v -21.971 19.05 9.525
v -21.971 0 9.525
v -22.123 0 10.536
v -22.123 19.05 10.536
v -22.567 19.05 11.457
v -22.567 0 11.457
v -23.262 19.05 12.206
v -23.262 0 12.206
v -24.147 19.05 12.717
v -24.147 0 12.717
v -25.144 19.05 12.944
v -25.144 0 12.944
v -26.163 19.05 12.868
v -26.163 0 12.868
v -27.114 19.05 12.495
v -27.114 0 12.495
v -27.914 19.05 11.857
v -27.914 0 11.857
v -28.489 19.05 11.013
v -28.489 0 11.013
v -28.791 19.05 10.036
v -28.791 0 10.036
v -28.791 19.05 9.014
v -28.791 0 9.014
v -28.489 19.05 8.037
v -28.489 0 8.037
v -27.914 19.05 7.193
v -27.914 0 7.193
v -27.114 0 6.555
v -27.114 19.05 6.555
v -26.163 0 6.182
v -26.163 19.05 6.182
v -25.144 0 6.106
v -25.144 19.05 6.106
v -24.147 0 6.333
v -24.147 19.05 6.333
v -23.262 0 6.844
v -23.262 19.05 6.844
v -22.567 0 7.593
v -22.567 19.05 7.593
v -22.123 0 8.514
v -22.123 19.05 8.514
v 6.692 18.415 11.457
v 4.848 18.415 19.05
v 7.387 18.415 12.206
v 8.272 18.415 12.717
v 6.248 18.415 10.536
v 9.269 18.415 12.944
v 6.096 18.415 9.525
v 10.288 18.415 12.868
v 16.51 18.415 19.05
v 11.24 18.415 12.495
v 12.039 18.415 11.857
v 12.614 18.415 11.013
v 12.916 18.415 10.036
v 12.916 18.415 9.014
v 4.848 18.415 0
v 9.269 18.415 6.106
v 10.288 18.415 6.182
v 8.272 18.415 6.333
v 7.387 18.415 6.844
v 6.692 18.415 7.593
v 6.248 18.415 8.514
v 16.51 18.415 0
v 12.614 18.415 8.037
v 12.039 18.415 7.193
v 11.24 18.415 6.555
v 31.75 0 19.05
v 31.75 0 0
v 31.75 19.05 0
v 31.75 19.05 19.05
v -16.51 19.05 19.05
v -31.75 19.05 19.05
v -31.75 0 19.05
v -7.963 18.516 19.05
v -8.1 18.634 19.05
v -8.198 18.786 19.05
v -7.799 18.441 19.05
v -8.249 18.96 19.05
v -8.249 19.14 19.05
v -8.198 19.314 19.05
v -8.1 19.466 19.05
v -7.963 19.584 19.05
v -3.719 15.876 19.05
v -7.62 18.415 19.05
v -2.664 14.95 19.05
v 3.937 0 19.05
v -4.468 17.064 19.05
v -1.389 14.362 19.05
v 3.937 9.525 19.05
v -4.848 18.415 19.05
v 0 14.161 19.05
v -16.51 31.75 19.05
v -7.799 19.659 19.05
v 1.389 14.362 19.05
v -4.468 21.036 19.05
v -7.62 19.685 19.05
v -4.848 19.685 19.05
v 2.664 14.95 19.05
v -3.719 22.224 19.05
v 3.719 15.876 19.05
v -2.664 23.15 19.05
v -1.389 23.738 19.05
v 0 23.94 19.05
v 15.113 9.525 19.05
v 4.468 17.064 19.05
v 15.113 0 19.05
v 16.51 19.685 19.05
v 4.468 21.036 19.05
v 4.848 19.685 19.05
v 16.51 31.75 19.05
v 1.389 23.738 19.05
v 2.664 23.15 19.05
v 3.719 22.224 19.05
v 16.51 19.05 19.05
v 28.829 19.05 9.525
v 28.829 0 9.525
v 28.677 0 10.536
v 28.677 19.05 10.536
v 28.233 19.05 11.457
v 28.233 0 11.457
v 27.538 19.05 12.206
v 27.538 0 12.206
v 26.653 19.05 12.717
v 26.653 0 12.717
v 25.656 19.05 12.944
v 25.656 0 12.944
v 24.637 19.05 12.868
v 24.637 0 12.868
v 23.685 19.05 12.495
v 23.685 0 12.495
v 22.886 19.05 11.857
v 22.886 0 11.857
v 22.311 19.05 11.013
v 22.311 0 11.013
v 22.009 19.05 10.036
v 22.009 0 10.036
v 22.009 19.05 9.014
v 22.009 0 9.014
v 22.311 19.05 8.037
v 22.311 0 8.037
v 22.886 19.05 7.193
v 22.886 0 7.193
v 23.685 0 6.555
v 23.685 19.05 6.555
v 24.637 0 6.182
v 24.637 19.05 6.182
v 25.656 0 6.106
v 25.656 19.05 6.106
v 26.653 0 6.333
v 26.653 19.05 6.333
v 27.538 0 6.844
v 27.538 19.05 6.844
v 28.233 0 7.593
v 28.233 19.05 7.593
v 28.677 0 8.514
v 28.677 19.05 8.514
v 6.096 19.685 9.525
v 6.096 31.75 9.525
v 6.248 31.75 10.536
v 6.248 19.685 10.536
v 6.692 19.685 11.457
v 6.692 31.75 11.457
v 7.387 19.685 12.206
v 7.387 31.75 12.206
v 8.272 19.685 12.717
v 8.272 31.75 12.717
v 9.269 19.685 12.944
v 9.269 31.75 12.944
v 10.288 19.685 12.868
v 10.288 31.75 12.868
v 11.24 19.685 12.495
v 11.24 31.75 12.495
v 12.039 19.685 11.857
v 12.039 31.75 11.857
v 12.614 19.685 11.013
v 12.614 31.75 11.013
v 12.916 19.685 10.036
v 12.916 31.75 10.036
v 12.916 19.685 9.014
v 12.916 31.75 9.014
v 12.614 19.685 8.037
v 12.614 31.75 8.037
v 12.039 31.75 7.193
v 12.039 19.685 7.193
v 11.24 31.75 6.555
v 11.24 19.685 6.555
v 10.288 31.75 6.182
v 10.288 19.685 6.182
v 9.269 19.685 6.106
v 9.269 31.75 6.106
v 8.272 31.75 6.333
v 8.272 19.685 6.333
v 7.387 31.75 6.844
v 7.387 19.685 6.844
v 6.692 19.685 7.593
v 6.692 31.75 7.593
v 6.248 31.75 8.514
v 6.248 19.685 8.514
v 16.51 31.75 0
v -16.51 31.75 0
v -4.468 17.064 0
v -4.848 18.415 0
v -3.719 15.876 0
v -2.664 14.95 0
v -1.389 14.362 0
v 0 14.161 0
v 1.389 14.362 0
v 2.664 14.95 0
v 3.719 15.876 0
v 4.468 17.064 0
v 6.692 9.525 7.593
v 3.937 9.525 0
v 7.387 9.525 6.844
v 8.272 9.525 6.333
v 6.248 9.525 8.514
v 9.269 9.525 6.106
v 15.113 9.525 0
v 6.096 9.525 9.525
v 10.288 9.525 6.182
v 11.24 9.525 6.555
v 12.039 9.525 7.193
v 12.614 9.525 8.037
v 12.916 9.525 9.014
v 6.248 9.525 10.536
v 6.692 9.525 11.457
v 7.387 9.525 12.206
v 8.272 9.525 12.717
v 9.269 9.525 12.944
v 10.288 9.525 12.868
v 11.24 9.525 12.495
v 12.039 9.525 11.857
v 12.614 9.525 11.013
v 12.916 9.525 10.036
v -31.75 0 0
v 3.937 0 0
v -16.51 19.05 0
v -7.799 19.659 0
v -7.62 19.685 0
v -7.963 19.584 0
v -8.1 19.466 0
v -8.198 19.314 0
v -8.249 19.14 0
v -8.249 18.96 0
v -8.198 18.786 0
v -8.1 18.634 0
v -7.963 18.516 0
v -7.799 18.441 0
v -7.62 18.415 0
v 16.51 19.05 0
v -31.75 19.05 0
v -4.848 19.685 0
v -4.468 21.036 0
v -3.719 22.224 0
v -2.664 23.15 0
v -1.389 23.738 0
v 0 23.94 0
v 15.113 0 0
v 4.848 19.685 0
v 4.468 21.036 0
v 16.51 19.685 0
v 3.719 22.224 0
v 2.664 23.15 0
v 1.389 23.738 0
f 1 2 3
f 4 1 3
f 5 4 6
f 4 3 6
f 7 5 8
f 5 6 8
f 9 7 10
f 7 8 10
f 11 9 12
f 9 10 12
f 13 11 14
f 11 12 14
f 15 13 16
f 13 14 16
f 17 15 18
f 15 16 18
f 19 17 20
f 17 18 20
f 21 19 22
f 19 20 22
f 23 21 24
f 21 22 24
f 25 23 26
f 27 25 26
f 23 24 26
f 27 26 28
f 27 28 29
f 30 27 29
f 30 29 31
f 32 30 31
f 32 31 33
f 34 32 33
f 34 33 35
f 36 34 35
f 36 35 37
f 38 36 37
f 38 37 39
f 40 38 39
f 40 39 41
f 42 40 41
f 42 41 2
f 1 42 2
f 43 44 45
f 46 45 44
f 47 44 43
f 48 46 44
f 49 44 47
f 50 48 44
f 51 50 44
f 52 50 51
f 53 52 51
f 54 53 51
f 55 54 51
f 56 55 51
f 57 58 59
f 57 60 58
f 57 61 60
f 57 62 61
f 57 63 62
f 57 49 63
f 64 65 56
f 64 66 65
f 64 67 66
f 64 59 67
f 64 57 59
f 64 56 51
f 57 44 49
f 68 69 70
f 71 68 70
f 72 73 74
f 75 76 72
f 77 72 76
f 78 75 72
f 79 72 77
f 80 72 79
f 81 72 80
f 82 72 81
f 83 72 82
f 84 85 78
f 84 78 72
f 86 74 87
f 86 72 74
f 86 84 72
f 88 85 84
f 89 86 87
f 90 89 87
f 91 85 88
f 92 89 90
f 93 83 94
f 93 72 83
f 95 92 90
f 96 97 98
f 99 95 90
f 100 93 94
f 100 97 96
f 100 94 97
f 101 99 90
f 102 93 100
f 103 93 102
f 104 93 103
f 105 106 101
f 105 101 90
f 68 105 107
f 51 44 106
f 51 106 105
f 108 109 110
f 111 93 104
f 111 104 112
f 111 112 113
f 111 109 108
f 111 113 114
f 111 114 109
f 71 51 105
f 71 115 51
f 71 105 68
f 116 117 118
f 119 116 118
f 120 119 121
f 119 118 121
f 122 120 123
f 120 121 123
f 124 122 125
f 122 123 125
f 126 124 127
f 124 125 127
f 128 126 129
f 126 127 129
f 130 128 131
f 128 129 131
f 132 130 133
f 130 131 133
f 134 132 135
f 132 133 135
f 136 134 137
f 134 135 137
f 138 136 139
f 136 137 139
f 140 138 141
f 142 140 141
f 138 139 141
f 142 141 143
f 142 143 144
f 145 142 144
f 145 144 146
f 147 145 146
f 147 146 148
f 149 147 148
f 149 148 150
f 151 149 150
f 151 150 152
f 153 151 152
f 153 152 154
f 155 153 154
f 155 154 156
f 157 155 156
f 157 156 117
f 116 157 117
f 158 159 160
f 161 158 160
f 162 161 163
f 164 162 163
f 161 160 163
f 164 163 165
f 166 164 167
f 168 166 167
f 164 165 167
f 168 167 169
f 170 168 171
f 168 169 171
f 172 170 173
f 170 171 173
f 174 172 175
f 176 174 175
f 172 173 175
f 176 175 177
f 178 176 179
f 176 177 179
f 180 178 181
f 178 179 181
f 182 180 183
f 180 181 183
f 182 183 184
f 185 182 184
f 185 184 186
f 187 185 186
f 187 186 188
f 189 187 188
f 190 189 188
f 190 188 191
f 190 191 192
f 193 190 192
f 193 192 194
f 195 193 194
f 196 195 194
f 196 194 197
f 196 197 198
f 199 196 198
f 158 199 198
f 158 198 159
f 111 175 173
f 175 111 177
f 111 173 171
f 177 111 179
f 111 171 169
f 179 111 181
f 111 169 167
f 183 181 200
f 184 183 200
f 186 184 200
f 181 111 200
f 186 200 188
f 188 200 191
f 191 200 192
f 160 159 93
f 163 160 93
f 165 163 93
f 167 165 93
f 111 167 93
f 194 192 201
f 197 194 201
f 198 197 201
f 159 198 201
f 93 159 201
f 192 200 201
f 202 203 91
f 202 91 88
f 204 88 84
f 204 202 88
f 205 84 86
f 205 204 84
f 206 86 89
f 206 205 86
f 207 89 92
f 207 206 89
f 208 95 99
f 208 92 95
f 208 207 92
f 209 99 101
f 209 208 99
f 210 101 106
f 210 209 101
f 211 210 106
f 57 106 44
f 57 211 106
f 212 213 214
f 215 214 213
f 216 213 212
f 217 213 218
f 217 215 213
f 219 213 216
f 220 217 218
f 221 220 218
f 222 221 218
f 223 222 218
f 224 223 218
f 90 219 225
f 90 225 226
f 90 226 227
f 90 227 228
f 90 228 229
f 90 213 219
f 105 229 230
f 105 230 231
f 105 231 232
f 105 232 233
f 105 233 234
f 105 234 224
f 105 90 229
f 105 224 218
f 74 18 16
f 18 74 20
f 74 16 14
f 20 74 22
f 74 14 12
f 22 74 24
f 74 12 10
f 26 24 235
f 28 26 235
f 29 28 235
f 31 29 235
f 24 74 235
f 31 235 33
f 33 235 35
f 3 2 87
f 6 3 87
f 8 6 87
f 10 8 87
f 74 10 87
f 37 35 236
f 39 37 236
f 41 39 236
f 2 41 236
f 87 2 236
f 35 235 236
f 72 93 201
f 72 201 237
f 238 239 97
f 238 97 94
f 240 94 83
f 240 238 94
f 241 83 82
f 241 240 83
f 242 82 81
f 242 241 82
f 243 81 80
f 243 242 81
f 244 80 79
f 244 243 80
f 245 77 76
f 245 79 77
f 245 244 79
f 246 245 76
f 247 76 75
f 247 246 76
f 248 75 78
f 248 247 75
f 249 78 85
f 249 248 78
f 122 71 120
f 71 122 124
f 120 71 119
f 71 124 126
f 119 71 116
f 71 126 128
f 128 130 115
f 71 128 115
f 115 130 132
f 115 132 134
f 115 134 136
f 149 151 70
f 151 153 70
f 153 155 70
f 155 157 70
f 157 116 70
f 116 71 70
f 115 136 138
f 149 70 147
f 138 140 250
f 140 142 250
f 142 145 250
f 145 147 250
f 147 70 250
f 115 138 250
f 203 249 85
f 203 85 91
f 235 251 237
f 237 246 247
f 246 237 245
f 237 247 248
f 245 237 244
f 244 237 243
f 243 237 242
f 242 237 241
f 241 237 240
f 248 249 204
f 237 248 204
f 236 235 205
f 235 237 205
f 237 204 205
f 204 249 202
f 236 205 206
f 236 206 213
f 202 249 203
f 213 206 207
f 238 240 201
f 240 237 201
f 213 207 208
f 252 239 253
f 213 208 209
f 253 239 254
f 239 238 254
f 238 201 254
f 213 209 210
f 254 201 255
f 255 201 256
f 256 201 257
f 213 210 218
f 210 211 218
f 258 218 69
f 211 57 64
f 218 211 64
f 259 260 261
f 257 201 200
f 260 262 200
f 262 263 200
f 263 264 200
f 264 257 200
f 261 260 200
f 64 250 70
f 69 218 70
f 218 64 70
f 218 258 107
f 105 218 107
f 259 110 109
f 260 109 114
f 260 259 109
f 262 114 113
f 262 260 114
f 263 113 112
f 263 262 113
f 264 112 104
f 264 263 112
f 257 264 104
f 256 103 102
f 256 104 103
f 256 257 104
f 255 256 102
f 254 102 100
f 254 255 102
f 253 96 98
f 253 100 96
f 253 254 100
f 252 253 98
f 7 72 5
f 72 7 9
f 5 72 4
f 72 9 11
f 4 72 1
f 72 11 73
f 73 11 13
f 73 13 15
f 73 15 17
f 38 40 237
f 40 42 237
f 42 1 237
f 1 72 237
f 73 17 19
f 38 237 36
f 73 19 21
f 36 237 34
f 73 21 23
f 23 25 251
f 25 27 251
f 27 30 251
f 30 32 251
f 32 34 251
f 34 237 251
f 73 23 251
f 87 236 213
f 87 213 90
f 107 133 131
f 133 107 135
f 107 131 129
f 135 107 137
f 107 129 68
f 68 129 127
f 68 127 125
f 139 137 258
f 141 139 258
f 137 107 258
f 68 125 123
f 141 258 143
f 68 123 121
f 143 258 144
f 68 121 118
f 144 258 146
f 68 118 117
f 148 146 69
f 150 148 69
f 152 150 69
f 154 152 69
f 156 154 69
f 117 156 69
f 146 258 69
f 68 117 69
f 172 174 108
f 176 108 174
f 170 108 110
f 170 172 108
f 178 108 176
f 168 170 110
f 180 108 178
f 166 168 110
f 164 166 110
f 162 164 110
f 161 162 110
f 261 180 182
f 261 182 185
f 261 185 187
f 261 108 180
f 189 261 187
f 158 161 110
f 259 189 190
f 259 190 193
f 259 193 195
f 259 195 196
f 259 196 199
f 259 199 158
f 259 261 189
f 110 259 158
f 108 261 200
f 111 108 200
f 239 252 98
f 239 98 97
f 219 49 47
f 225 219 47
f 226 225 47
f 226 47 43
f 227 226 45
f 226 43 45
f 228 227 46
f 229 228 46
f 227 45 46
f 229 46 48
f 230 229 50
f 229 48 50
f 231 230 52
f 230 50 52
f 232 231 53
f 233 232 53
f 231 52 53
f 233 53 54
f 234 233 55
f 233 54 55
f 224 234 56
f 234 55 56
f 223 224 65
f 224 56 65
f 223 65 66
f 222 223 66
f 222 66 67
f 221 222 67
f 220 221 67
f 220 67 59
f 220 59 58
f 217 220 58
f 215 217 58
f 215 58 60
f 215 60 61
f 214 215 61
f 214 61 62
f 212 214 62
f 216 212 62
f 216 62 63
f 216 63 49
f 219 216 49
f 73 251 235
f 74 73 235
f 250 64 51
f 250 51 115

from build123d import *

# Parameters (mm, degrees)
F1_DEPTH = 19.05
F3_DEPTH = 19.051
F4_R     = 3.429
F5_DEPTH = 31.751
F6_W     = 11.176
F6_H     = 19.05
F7_DEPTH = 9.525
F8_R     = 3.429
F9_DEPTH = 31.751


with BuildPart() as f1:
    # F0 (on Top) → F1 (new body)
    with BuildSketch(Plane.XY):
        Polygon((-31.75, 19.05), (-31.75, 0), (31.75, 0), (31.75, 19.05), (16.51, 19.05), (16.51, 31.75), (-16.51, 31.75), (-16.51, 19.05), align=None)
    extrude(amount=F1_DEPTH)

    # F2 (on Top) → F3 (cut, through all)
    with BuildSketch(Plane.XY):
        with BuildLine():
            Line((-7.62, 18.415), (-4.848091, 18.415))
            ThreePointArc((-4.848091, 18.415), (0, 14.1605), (4.848091, 18.415))
            Line((4.848091, 18.415), (16.51, 18.415))
            Line((16.51, 18.415), (16.51, 19.685))
            Line((16.51, 19.685), (4.848091, 19.685))
            ThreePointArc((4.848091, 19.685), (0, 23.9395), (-4.848091, 19.685))
            Line((-4.848091, 19.685), (-7.62, 19.685))
            ThreePointArc((-7.62, 19.685), (-8.255, 19.05), (-7.62, 18.415))
        make_face()
    extrude(amount=F3_DEPTH, mode=Mode.SUBTRACT)

    # F4 (on Front) → F5 (cut, through all)
    with BuildSketch(Plane.XZ):
        with Locations((25.4, 9.525)):
            Circle(F4_R)
        with Locations((-25.4, 9.525)):
            Circle(F4_R)
    extrude(amount=-F5_DEPTH, mode=Mode.SUBTRACT)

    # F6 (on Front) → F7 (cut)
    with BuildSketch(Plane.XZ):
        with Locations((9.525, 9.525)):
            Rectangle(F6_W, F6_H)
    extrude(amount=-F7_DEPTH, mode=Mode.SUBTRACT)

    # F8 (on face) → F9 (cut, through all)
    with BuildSketch(Plane(origin=(0, 31.75, 0), x_dir=(-1, 0, 0), z_dir=(0, 1, 0))):
        with Locations((-9.525, 9.525)):
            Circle(F8_R)
    extrude(amount=-F9_DEPTH, mode=Mode.SUBTRACT)


solid = f1.part
